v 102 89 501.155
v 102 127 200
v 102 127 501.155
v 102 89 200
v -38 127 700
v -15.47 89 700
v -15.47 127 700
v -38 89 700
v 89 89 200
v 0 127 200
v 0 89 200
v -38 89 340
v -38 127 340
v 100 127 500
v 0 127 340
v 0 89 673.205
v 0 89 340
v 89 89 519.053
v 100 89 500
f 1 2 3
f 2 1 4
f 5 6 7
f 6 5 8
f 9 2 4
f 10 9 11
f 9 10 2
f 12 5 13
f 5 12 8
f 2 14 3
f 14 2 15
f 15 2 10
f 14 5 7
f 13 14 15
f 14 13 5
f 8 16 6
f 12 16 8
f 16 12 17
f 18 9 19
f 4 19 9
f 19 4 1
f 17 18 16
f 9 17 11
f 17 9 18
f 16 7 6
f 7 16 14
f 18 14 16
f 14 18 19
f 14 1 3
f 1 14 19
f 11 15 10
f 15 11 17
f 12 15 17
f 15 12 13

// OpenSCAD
//http://mistupid.com/homeimpr/lumber.htm

module bedPosts()
{	
	cube([89,89,2000]); 							//Post 1 (4x4)
	
	translate([0,distBtwPosts + 89,0]) { 			//Post 2 (4x4)
		cube([89,89,2000]);
	}

	translate([-38,0,heightOfSides]) { //Side 1
		cube([38,distBtwPosts + (89*2) + 38,140]);	//Side 1 (2x6)
	}

	
	translate([0,distBtwPosts + (89*2),heightOfSides]) { 		//Side 2 (2x6)
		cube([1220,38,140]);
	}
}


module sofaFrame() {
	
	difference() {
		
	
		translate([-38, 89, heightOfSides]) {
			cube([140, 38, heightOfSofaBack]);
		}

		translate([100, 85, heightOfSides + 300]) {
			rotate(-30, [0,1,0]) {
				cube([140, 50, 300]);
			}
		}
	}
	

	
	
}

distBtwPosts = 1220;
heightOfSides = 200;
heightOfSofaBack = 500;

difference() {
	sofaFrame(); 
	bedPosts();
}

% bedPosts();
